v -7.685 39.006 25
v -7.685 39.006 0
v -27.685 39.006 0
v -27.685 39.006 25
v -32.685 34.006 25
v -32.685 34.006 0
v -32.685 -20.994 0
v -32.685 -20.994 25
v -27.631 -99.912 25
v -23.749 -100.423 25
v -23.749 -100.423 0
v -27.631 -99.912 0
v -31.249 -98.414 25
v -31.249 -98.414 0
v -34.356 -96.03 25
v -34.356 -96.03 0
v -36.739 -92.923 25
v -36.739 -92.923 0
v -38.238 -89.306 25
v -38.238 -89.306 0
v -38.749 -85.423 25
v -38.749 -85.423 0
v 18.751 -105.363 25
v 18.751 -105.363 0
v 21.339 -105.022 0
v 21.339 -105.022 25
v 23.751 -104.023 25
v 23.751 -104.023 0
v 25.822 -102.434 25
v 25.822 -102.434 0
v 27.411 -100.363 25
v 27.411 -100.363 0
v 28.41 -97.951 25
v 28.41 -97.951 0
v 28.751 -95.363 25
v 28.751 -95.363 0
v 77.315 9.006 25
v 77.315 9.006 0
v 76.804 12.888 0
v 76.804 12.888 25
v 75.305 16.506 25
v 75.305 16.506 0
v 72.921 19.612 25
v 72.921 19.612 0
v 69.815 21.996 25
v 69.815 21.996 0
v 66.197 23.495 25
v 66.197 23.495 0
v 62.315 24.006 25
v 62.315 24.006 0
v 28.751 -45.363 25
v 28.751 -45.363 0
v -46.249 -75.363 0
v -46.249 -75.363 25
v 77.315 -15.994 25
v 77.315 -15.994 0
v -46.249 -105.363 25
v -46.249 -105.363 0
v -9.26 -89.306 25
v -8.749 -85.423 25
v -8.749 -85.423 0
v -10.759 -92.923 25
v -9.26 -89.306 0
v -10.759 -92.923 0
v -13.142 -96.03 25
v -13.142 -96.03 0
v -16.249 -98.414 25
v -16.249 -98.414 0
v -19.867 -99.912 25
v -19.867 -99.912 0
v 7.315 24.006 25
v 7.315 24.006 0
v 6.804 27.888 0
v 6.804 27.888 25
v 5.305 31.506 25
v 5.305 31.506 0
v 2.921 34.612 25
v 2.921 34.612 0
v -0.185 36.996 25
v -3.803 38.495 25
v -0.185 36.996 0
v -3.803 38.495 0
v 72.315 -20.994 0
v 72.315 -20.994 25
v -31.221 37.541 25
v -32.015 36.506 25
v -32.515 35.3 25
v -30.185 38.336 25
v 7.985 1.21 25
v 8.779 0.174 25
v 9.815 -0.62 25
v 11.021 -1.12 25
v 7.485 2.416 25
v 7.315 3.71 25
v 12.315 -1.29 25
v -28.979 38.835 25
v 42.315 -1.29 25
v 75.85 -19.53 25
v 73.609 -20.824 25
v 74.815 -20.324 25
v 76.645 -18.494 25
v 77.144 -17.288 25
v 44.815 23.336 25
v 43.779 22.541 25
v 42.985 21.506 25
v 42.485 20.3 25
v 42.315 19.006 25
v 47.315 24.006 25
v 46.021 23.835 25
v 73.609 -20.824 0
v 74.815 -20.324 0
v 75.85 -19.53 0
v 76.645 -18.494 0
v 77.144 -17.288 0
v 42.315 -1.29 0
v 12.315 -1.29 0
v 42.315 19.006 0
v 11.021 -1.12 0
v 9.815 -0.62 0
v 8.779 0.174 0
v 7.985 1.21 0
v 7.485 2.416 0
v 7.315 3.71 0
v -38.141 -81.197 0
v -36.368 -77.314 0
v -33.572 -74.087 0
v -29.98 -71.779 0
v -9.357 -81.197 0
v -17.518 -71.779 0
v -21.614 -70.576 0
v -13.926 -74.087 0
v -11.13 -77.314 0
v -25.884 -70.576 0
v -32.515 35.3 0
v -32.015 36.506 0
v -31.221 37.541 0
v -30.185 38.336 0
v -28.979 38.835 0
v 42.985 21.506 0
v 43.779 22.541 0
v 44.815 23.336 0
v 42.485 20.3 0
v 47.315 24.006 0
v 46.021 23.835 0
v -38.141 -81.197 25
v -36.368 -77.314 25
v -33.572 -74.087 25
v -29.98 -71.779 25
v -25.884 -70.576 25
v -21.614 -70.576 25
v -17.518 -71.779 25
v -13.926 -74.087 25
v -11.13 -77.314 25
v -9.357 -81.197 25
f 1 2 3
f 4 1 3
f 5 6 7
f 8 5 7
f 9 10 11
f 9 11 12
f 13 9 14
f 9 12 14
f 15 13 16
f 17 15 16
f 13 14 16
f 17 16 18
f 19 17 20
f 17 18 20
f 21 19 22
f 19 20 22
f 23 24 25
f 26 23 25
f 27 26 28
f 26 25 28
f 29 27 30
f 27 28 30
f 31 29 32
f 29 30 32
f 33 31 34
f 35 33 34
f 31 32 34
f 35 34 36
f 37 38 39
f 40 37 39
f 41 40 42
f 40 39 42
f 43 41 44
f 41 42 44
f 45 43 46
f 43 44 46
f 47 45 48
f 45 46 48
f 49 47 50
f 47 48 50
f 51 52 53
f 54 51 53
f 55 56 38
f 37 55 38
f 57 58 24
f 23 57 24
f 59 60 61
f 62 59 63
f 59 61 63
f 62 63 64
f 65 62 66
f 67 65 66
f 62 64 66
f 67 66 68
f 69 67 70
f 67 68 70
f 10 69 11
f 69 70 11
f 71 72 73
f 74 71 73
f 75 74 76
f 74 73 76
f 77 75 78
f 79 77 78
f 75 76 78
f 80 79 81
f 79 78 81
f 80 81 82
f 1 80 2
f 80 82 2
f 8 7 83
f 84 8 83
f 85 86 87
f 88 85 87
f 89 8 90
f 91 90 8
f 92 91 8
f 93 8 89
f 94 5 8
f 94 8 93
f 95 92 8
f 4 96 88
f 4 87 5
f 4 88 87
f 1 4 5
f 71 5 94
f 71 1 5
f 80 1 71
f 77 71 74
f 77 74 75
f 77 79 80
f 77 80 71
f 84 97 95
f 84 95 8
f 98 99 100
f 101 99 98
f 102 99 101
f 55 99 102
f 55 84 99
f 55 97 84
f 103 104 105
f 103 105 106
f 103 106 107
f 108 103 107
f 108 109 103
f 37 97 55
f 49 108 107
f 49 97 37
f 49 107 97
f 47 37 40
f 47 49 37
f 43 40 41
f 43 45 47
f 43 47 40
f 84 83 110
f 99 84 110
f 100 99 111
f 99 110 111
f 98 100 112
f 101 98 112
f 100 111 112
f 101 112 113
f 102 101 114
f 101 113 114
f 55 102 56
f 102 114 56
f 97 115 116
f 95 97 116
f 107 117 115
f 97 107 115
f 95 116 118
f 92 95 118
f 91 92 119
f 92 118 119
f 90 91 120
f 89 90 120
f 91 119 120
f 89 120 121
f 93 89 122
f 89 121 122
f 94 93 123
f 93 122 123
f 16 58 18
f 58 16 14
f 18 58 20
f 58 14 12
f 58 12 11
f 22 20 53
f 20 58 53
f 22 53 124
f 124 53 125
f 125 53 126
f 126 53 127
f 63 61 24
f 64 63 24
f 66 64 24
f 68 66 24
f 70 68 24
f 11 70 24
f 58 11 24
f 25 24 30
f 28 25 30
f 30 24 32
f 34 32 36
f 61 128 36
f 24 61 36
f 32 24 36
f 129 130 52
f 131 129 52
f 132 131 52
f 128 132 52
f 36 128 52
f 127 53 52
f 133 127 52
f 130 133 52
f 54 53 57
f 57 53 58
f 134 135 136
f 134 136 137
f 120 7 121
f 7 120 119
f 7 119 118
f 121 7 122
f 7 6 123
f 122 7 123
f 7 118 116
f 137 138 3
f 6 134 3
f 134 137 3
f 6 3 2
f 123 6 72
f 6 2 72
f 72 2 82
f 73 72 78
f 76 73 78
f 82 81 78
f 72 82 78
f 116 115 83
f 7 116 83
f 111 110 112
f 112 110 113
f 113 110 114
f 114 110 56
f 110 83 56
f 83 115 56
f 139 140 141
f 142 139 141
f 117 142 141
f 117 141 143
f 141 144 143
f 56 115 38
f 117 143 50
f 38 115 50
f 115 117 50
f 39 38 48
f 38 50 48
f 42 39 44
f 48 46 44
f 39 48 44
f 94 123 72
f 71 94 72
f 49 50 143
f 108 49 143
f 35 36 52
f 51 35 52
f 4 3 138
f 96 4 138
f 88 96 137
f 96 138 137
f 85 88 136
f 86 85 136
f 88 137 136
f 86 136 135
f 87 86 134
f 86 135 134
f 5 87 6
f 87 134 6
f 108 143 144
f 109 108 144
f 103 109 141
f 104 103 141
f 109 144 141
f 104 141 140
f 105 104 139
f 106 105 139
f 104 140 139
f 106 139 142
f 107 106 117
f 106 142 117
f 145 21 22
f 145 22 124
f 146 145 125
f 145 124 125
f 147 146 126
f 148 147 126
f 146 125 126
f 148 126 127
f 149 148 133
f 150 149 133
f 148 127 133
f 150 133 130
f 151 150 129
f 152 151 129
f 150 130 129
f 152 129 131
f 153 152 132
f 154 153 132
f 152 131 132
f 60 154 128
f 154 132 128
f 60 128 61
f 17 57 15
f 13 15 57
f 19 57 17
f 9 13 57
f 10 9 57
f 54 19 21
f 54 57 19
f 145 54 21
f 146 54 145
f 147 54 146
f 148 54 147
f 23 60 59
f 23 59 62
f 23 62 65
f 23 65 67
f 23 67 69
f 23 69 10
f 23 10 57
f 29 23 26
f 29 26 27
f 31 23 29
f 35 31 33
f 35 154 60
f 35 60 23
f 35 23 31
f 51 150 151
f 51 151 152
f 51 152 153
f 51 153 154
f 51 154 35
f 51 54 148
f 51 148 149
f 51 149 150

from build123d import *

# Parameters (mm, degrees)
F1_DEPTH = 25


with BuildPart() as f1:
    # F0 (on Top) → F1 (new body)
    with BuildSketch(Plane.XY):
        with BuildLine():
            ThreePointArc((-27.685185, 39.005755), (-31.220719, 37.541289), (-32.685185, 34.005755))
            Line((-32.685185, 34.005755), (-32.685185, -20.994245))
            Line((-32.685185, -20.994245), (72.314815, -20.994245))
            ThreePointArc((72.314815, -20.994245), (75.850349, -19.529779), (77.314815, -15.994245))
            Line((77.314815, -15.994245), (77.314815, 9.005755))
            ThreePointArc((77.314815, 9.005755), (72.921417, 19.612357), (62.314815, 24.005755))
            Line((62.314815, 24.005755), (47.314815, 24.005755))
            ThreePointArc((47.314815, 24.005755), (43.779281, 22.541289), (42.314815, 19.005755))
            Line((42.314815, 19.005755), (42.314815, -1.289996))
            Line((42.314815, -1.289996), (12.314815, -1.289996))
            ThreePointArc((12.314815, -1.289996), (8.779281, 0.17447), (7.314815, 3.710004))
            Line((7.314815, 3.710004), (7.314815, 24.005755))
            ThreePointArc((7.314815, 24.005755), (2.921417, 34.612357), (-7.685185, 39.005755))
            Line((-7.685185, 39.005755), (-27.685185, 39.005755))
        make_face()
        with BuildLine():
            Line((-23.74903, -100.423313), (-23.74903, -105.363107))
            Line((-23.74903, -105.363107), (18.75097, -105.363107))
            ThreePointArc((18.75097, -105.363107), (25.822038, -102.434175), (28.75097, -95.363107))
            Line((28.75097, -95.363107), (28.75097, -45.363107))
            Line((28.75097, -45.363107), (-46.24903, -75.363107))
            Line((-46.24903, -75.363107), (-46.24903, -85.423313))
            Line((-46.24903, -85.423313), (-38.74903, -85.423313))
            ThreePointArc((-38.74903, -85.423313), (-23.74903, -70.423313), (-8.74903, -85.423313))
            ThreePointArc((-8.74903, -85.423313), (-13.142428, -96.029915), (-23.74903, -100.423313))
        make_face()
        with BuildLine():
            Line((-46.24903, -85.423313), (-46.24903, -105.363107))
            Line((-46.24903, -105.363107), (-23.74903, -105.363107))
            Line((-23.74903, -105.363107), (-23.74903, -100.423313))
            ThreePointArc((-23.74903, -100.423313), (-34.355632, -96.029915), (-38.74903, -85.423313))
            Line((-38.74903, -85.423313), (-46.24903, -85.423313))
        make_face()
    extrude(amount=F1_DEPTH)


solid = f1.part
